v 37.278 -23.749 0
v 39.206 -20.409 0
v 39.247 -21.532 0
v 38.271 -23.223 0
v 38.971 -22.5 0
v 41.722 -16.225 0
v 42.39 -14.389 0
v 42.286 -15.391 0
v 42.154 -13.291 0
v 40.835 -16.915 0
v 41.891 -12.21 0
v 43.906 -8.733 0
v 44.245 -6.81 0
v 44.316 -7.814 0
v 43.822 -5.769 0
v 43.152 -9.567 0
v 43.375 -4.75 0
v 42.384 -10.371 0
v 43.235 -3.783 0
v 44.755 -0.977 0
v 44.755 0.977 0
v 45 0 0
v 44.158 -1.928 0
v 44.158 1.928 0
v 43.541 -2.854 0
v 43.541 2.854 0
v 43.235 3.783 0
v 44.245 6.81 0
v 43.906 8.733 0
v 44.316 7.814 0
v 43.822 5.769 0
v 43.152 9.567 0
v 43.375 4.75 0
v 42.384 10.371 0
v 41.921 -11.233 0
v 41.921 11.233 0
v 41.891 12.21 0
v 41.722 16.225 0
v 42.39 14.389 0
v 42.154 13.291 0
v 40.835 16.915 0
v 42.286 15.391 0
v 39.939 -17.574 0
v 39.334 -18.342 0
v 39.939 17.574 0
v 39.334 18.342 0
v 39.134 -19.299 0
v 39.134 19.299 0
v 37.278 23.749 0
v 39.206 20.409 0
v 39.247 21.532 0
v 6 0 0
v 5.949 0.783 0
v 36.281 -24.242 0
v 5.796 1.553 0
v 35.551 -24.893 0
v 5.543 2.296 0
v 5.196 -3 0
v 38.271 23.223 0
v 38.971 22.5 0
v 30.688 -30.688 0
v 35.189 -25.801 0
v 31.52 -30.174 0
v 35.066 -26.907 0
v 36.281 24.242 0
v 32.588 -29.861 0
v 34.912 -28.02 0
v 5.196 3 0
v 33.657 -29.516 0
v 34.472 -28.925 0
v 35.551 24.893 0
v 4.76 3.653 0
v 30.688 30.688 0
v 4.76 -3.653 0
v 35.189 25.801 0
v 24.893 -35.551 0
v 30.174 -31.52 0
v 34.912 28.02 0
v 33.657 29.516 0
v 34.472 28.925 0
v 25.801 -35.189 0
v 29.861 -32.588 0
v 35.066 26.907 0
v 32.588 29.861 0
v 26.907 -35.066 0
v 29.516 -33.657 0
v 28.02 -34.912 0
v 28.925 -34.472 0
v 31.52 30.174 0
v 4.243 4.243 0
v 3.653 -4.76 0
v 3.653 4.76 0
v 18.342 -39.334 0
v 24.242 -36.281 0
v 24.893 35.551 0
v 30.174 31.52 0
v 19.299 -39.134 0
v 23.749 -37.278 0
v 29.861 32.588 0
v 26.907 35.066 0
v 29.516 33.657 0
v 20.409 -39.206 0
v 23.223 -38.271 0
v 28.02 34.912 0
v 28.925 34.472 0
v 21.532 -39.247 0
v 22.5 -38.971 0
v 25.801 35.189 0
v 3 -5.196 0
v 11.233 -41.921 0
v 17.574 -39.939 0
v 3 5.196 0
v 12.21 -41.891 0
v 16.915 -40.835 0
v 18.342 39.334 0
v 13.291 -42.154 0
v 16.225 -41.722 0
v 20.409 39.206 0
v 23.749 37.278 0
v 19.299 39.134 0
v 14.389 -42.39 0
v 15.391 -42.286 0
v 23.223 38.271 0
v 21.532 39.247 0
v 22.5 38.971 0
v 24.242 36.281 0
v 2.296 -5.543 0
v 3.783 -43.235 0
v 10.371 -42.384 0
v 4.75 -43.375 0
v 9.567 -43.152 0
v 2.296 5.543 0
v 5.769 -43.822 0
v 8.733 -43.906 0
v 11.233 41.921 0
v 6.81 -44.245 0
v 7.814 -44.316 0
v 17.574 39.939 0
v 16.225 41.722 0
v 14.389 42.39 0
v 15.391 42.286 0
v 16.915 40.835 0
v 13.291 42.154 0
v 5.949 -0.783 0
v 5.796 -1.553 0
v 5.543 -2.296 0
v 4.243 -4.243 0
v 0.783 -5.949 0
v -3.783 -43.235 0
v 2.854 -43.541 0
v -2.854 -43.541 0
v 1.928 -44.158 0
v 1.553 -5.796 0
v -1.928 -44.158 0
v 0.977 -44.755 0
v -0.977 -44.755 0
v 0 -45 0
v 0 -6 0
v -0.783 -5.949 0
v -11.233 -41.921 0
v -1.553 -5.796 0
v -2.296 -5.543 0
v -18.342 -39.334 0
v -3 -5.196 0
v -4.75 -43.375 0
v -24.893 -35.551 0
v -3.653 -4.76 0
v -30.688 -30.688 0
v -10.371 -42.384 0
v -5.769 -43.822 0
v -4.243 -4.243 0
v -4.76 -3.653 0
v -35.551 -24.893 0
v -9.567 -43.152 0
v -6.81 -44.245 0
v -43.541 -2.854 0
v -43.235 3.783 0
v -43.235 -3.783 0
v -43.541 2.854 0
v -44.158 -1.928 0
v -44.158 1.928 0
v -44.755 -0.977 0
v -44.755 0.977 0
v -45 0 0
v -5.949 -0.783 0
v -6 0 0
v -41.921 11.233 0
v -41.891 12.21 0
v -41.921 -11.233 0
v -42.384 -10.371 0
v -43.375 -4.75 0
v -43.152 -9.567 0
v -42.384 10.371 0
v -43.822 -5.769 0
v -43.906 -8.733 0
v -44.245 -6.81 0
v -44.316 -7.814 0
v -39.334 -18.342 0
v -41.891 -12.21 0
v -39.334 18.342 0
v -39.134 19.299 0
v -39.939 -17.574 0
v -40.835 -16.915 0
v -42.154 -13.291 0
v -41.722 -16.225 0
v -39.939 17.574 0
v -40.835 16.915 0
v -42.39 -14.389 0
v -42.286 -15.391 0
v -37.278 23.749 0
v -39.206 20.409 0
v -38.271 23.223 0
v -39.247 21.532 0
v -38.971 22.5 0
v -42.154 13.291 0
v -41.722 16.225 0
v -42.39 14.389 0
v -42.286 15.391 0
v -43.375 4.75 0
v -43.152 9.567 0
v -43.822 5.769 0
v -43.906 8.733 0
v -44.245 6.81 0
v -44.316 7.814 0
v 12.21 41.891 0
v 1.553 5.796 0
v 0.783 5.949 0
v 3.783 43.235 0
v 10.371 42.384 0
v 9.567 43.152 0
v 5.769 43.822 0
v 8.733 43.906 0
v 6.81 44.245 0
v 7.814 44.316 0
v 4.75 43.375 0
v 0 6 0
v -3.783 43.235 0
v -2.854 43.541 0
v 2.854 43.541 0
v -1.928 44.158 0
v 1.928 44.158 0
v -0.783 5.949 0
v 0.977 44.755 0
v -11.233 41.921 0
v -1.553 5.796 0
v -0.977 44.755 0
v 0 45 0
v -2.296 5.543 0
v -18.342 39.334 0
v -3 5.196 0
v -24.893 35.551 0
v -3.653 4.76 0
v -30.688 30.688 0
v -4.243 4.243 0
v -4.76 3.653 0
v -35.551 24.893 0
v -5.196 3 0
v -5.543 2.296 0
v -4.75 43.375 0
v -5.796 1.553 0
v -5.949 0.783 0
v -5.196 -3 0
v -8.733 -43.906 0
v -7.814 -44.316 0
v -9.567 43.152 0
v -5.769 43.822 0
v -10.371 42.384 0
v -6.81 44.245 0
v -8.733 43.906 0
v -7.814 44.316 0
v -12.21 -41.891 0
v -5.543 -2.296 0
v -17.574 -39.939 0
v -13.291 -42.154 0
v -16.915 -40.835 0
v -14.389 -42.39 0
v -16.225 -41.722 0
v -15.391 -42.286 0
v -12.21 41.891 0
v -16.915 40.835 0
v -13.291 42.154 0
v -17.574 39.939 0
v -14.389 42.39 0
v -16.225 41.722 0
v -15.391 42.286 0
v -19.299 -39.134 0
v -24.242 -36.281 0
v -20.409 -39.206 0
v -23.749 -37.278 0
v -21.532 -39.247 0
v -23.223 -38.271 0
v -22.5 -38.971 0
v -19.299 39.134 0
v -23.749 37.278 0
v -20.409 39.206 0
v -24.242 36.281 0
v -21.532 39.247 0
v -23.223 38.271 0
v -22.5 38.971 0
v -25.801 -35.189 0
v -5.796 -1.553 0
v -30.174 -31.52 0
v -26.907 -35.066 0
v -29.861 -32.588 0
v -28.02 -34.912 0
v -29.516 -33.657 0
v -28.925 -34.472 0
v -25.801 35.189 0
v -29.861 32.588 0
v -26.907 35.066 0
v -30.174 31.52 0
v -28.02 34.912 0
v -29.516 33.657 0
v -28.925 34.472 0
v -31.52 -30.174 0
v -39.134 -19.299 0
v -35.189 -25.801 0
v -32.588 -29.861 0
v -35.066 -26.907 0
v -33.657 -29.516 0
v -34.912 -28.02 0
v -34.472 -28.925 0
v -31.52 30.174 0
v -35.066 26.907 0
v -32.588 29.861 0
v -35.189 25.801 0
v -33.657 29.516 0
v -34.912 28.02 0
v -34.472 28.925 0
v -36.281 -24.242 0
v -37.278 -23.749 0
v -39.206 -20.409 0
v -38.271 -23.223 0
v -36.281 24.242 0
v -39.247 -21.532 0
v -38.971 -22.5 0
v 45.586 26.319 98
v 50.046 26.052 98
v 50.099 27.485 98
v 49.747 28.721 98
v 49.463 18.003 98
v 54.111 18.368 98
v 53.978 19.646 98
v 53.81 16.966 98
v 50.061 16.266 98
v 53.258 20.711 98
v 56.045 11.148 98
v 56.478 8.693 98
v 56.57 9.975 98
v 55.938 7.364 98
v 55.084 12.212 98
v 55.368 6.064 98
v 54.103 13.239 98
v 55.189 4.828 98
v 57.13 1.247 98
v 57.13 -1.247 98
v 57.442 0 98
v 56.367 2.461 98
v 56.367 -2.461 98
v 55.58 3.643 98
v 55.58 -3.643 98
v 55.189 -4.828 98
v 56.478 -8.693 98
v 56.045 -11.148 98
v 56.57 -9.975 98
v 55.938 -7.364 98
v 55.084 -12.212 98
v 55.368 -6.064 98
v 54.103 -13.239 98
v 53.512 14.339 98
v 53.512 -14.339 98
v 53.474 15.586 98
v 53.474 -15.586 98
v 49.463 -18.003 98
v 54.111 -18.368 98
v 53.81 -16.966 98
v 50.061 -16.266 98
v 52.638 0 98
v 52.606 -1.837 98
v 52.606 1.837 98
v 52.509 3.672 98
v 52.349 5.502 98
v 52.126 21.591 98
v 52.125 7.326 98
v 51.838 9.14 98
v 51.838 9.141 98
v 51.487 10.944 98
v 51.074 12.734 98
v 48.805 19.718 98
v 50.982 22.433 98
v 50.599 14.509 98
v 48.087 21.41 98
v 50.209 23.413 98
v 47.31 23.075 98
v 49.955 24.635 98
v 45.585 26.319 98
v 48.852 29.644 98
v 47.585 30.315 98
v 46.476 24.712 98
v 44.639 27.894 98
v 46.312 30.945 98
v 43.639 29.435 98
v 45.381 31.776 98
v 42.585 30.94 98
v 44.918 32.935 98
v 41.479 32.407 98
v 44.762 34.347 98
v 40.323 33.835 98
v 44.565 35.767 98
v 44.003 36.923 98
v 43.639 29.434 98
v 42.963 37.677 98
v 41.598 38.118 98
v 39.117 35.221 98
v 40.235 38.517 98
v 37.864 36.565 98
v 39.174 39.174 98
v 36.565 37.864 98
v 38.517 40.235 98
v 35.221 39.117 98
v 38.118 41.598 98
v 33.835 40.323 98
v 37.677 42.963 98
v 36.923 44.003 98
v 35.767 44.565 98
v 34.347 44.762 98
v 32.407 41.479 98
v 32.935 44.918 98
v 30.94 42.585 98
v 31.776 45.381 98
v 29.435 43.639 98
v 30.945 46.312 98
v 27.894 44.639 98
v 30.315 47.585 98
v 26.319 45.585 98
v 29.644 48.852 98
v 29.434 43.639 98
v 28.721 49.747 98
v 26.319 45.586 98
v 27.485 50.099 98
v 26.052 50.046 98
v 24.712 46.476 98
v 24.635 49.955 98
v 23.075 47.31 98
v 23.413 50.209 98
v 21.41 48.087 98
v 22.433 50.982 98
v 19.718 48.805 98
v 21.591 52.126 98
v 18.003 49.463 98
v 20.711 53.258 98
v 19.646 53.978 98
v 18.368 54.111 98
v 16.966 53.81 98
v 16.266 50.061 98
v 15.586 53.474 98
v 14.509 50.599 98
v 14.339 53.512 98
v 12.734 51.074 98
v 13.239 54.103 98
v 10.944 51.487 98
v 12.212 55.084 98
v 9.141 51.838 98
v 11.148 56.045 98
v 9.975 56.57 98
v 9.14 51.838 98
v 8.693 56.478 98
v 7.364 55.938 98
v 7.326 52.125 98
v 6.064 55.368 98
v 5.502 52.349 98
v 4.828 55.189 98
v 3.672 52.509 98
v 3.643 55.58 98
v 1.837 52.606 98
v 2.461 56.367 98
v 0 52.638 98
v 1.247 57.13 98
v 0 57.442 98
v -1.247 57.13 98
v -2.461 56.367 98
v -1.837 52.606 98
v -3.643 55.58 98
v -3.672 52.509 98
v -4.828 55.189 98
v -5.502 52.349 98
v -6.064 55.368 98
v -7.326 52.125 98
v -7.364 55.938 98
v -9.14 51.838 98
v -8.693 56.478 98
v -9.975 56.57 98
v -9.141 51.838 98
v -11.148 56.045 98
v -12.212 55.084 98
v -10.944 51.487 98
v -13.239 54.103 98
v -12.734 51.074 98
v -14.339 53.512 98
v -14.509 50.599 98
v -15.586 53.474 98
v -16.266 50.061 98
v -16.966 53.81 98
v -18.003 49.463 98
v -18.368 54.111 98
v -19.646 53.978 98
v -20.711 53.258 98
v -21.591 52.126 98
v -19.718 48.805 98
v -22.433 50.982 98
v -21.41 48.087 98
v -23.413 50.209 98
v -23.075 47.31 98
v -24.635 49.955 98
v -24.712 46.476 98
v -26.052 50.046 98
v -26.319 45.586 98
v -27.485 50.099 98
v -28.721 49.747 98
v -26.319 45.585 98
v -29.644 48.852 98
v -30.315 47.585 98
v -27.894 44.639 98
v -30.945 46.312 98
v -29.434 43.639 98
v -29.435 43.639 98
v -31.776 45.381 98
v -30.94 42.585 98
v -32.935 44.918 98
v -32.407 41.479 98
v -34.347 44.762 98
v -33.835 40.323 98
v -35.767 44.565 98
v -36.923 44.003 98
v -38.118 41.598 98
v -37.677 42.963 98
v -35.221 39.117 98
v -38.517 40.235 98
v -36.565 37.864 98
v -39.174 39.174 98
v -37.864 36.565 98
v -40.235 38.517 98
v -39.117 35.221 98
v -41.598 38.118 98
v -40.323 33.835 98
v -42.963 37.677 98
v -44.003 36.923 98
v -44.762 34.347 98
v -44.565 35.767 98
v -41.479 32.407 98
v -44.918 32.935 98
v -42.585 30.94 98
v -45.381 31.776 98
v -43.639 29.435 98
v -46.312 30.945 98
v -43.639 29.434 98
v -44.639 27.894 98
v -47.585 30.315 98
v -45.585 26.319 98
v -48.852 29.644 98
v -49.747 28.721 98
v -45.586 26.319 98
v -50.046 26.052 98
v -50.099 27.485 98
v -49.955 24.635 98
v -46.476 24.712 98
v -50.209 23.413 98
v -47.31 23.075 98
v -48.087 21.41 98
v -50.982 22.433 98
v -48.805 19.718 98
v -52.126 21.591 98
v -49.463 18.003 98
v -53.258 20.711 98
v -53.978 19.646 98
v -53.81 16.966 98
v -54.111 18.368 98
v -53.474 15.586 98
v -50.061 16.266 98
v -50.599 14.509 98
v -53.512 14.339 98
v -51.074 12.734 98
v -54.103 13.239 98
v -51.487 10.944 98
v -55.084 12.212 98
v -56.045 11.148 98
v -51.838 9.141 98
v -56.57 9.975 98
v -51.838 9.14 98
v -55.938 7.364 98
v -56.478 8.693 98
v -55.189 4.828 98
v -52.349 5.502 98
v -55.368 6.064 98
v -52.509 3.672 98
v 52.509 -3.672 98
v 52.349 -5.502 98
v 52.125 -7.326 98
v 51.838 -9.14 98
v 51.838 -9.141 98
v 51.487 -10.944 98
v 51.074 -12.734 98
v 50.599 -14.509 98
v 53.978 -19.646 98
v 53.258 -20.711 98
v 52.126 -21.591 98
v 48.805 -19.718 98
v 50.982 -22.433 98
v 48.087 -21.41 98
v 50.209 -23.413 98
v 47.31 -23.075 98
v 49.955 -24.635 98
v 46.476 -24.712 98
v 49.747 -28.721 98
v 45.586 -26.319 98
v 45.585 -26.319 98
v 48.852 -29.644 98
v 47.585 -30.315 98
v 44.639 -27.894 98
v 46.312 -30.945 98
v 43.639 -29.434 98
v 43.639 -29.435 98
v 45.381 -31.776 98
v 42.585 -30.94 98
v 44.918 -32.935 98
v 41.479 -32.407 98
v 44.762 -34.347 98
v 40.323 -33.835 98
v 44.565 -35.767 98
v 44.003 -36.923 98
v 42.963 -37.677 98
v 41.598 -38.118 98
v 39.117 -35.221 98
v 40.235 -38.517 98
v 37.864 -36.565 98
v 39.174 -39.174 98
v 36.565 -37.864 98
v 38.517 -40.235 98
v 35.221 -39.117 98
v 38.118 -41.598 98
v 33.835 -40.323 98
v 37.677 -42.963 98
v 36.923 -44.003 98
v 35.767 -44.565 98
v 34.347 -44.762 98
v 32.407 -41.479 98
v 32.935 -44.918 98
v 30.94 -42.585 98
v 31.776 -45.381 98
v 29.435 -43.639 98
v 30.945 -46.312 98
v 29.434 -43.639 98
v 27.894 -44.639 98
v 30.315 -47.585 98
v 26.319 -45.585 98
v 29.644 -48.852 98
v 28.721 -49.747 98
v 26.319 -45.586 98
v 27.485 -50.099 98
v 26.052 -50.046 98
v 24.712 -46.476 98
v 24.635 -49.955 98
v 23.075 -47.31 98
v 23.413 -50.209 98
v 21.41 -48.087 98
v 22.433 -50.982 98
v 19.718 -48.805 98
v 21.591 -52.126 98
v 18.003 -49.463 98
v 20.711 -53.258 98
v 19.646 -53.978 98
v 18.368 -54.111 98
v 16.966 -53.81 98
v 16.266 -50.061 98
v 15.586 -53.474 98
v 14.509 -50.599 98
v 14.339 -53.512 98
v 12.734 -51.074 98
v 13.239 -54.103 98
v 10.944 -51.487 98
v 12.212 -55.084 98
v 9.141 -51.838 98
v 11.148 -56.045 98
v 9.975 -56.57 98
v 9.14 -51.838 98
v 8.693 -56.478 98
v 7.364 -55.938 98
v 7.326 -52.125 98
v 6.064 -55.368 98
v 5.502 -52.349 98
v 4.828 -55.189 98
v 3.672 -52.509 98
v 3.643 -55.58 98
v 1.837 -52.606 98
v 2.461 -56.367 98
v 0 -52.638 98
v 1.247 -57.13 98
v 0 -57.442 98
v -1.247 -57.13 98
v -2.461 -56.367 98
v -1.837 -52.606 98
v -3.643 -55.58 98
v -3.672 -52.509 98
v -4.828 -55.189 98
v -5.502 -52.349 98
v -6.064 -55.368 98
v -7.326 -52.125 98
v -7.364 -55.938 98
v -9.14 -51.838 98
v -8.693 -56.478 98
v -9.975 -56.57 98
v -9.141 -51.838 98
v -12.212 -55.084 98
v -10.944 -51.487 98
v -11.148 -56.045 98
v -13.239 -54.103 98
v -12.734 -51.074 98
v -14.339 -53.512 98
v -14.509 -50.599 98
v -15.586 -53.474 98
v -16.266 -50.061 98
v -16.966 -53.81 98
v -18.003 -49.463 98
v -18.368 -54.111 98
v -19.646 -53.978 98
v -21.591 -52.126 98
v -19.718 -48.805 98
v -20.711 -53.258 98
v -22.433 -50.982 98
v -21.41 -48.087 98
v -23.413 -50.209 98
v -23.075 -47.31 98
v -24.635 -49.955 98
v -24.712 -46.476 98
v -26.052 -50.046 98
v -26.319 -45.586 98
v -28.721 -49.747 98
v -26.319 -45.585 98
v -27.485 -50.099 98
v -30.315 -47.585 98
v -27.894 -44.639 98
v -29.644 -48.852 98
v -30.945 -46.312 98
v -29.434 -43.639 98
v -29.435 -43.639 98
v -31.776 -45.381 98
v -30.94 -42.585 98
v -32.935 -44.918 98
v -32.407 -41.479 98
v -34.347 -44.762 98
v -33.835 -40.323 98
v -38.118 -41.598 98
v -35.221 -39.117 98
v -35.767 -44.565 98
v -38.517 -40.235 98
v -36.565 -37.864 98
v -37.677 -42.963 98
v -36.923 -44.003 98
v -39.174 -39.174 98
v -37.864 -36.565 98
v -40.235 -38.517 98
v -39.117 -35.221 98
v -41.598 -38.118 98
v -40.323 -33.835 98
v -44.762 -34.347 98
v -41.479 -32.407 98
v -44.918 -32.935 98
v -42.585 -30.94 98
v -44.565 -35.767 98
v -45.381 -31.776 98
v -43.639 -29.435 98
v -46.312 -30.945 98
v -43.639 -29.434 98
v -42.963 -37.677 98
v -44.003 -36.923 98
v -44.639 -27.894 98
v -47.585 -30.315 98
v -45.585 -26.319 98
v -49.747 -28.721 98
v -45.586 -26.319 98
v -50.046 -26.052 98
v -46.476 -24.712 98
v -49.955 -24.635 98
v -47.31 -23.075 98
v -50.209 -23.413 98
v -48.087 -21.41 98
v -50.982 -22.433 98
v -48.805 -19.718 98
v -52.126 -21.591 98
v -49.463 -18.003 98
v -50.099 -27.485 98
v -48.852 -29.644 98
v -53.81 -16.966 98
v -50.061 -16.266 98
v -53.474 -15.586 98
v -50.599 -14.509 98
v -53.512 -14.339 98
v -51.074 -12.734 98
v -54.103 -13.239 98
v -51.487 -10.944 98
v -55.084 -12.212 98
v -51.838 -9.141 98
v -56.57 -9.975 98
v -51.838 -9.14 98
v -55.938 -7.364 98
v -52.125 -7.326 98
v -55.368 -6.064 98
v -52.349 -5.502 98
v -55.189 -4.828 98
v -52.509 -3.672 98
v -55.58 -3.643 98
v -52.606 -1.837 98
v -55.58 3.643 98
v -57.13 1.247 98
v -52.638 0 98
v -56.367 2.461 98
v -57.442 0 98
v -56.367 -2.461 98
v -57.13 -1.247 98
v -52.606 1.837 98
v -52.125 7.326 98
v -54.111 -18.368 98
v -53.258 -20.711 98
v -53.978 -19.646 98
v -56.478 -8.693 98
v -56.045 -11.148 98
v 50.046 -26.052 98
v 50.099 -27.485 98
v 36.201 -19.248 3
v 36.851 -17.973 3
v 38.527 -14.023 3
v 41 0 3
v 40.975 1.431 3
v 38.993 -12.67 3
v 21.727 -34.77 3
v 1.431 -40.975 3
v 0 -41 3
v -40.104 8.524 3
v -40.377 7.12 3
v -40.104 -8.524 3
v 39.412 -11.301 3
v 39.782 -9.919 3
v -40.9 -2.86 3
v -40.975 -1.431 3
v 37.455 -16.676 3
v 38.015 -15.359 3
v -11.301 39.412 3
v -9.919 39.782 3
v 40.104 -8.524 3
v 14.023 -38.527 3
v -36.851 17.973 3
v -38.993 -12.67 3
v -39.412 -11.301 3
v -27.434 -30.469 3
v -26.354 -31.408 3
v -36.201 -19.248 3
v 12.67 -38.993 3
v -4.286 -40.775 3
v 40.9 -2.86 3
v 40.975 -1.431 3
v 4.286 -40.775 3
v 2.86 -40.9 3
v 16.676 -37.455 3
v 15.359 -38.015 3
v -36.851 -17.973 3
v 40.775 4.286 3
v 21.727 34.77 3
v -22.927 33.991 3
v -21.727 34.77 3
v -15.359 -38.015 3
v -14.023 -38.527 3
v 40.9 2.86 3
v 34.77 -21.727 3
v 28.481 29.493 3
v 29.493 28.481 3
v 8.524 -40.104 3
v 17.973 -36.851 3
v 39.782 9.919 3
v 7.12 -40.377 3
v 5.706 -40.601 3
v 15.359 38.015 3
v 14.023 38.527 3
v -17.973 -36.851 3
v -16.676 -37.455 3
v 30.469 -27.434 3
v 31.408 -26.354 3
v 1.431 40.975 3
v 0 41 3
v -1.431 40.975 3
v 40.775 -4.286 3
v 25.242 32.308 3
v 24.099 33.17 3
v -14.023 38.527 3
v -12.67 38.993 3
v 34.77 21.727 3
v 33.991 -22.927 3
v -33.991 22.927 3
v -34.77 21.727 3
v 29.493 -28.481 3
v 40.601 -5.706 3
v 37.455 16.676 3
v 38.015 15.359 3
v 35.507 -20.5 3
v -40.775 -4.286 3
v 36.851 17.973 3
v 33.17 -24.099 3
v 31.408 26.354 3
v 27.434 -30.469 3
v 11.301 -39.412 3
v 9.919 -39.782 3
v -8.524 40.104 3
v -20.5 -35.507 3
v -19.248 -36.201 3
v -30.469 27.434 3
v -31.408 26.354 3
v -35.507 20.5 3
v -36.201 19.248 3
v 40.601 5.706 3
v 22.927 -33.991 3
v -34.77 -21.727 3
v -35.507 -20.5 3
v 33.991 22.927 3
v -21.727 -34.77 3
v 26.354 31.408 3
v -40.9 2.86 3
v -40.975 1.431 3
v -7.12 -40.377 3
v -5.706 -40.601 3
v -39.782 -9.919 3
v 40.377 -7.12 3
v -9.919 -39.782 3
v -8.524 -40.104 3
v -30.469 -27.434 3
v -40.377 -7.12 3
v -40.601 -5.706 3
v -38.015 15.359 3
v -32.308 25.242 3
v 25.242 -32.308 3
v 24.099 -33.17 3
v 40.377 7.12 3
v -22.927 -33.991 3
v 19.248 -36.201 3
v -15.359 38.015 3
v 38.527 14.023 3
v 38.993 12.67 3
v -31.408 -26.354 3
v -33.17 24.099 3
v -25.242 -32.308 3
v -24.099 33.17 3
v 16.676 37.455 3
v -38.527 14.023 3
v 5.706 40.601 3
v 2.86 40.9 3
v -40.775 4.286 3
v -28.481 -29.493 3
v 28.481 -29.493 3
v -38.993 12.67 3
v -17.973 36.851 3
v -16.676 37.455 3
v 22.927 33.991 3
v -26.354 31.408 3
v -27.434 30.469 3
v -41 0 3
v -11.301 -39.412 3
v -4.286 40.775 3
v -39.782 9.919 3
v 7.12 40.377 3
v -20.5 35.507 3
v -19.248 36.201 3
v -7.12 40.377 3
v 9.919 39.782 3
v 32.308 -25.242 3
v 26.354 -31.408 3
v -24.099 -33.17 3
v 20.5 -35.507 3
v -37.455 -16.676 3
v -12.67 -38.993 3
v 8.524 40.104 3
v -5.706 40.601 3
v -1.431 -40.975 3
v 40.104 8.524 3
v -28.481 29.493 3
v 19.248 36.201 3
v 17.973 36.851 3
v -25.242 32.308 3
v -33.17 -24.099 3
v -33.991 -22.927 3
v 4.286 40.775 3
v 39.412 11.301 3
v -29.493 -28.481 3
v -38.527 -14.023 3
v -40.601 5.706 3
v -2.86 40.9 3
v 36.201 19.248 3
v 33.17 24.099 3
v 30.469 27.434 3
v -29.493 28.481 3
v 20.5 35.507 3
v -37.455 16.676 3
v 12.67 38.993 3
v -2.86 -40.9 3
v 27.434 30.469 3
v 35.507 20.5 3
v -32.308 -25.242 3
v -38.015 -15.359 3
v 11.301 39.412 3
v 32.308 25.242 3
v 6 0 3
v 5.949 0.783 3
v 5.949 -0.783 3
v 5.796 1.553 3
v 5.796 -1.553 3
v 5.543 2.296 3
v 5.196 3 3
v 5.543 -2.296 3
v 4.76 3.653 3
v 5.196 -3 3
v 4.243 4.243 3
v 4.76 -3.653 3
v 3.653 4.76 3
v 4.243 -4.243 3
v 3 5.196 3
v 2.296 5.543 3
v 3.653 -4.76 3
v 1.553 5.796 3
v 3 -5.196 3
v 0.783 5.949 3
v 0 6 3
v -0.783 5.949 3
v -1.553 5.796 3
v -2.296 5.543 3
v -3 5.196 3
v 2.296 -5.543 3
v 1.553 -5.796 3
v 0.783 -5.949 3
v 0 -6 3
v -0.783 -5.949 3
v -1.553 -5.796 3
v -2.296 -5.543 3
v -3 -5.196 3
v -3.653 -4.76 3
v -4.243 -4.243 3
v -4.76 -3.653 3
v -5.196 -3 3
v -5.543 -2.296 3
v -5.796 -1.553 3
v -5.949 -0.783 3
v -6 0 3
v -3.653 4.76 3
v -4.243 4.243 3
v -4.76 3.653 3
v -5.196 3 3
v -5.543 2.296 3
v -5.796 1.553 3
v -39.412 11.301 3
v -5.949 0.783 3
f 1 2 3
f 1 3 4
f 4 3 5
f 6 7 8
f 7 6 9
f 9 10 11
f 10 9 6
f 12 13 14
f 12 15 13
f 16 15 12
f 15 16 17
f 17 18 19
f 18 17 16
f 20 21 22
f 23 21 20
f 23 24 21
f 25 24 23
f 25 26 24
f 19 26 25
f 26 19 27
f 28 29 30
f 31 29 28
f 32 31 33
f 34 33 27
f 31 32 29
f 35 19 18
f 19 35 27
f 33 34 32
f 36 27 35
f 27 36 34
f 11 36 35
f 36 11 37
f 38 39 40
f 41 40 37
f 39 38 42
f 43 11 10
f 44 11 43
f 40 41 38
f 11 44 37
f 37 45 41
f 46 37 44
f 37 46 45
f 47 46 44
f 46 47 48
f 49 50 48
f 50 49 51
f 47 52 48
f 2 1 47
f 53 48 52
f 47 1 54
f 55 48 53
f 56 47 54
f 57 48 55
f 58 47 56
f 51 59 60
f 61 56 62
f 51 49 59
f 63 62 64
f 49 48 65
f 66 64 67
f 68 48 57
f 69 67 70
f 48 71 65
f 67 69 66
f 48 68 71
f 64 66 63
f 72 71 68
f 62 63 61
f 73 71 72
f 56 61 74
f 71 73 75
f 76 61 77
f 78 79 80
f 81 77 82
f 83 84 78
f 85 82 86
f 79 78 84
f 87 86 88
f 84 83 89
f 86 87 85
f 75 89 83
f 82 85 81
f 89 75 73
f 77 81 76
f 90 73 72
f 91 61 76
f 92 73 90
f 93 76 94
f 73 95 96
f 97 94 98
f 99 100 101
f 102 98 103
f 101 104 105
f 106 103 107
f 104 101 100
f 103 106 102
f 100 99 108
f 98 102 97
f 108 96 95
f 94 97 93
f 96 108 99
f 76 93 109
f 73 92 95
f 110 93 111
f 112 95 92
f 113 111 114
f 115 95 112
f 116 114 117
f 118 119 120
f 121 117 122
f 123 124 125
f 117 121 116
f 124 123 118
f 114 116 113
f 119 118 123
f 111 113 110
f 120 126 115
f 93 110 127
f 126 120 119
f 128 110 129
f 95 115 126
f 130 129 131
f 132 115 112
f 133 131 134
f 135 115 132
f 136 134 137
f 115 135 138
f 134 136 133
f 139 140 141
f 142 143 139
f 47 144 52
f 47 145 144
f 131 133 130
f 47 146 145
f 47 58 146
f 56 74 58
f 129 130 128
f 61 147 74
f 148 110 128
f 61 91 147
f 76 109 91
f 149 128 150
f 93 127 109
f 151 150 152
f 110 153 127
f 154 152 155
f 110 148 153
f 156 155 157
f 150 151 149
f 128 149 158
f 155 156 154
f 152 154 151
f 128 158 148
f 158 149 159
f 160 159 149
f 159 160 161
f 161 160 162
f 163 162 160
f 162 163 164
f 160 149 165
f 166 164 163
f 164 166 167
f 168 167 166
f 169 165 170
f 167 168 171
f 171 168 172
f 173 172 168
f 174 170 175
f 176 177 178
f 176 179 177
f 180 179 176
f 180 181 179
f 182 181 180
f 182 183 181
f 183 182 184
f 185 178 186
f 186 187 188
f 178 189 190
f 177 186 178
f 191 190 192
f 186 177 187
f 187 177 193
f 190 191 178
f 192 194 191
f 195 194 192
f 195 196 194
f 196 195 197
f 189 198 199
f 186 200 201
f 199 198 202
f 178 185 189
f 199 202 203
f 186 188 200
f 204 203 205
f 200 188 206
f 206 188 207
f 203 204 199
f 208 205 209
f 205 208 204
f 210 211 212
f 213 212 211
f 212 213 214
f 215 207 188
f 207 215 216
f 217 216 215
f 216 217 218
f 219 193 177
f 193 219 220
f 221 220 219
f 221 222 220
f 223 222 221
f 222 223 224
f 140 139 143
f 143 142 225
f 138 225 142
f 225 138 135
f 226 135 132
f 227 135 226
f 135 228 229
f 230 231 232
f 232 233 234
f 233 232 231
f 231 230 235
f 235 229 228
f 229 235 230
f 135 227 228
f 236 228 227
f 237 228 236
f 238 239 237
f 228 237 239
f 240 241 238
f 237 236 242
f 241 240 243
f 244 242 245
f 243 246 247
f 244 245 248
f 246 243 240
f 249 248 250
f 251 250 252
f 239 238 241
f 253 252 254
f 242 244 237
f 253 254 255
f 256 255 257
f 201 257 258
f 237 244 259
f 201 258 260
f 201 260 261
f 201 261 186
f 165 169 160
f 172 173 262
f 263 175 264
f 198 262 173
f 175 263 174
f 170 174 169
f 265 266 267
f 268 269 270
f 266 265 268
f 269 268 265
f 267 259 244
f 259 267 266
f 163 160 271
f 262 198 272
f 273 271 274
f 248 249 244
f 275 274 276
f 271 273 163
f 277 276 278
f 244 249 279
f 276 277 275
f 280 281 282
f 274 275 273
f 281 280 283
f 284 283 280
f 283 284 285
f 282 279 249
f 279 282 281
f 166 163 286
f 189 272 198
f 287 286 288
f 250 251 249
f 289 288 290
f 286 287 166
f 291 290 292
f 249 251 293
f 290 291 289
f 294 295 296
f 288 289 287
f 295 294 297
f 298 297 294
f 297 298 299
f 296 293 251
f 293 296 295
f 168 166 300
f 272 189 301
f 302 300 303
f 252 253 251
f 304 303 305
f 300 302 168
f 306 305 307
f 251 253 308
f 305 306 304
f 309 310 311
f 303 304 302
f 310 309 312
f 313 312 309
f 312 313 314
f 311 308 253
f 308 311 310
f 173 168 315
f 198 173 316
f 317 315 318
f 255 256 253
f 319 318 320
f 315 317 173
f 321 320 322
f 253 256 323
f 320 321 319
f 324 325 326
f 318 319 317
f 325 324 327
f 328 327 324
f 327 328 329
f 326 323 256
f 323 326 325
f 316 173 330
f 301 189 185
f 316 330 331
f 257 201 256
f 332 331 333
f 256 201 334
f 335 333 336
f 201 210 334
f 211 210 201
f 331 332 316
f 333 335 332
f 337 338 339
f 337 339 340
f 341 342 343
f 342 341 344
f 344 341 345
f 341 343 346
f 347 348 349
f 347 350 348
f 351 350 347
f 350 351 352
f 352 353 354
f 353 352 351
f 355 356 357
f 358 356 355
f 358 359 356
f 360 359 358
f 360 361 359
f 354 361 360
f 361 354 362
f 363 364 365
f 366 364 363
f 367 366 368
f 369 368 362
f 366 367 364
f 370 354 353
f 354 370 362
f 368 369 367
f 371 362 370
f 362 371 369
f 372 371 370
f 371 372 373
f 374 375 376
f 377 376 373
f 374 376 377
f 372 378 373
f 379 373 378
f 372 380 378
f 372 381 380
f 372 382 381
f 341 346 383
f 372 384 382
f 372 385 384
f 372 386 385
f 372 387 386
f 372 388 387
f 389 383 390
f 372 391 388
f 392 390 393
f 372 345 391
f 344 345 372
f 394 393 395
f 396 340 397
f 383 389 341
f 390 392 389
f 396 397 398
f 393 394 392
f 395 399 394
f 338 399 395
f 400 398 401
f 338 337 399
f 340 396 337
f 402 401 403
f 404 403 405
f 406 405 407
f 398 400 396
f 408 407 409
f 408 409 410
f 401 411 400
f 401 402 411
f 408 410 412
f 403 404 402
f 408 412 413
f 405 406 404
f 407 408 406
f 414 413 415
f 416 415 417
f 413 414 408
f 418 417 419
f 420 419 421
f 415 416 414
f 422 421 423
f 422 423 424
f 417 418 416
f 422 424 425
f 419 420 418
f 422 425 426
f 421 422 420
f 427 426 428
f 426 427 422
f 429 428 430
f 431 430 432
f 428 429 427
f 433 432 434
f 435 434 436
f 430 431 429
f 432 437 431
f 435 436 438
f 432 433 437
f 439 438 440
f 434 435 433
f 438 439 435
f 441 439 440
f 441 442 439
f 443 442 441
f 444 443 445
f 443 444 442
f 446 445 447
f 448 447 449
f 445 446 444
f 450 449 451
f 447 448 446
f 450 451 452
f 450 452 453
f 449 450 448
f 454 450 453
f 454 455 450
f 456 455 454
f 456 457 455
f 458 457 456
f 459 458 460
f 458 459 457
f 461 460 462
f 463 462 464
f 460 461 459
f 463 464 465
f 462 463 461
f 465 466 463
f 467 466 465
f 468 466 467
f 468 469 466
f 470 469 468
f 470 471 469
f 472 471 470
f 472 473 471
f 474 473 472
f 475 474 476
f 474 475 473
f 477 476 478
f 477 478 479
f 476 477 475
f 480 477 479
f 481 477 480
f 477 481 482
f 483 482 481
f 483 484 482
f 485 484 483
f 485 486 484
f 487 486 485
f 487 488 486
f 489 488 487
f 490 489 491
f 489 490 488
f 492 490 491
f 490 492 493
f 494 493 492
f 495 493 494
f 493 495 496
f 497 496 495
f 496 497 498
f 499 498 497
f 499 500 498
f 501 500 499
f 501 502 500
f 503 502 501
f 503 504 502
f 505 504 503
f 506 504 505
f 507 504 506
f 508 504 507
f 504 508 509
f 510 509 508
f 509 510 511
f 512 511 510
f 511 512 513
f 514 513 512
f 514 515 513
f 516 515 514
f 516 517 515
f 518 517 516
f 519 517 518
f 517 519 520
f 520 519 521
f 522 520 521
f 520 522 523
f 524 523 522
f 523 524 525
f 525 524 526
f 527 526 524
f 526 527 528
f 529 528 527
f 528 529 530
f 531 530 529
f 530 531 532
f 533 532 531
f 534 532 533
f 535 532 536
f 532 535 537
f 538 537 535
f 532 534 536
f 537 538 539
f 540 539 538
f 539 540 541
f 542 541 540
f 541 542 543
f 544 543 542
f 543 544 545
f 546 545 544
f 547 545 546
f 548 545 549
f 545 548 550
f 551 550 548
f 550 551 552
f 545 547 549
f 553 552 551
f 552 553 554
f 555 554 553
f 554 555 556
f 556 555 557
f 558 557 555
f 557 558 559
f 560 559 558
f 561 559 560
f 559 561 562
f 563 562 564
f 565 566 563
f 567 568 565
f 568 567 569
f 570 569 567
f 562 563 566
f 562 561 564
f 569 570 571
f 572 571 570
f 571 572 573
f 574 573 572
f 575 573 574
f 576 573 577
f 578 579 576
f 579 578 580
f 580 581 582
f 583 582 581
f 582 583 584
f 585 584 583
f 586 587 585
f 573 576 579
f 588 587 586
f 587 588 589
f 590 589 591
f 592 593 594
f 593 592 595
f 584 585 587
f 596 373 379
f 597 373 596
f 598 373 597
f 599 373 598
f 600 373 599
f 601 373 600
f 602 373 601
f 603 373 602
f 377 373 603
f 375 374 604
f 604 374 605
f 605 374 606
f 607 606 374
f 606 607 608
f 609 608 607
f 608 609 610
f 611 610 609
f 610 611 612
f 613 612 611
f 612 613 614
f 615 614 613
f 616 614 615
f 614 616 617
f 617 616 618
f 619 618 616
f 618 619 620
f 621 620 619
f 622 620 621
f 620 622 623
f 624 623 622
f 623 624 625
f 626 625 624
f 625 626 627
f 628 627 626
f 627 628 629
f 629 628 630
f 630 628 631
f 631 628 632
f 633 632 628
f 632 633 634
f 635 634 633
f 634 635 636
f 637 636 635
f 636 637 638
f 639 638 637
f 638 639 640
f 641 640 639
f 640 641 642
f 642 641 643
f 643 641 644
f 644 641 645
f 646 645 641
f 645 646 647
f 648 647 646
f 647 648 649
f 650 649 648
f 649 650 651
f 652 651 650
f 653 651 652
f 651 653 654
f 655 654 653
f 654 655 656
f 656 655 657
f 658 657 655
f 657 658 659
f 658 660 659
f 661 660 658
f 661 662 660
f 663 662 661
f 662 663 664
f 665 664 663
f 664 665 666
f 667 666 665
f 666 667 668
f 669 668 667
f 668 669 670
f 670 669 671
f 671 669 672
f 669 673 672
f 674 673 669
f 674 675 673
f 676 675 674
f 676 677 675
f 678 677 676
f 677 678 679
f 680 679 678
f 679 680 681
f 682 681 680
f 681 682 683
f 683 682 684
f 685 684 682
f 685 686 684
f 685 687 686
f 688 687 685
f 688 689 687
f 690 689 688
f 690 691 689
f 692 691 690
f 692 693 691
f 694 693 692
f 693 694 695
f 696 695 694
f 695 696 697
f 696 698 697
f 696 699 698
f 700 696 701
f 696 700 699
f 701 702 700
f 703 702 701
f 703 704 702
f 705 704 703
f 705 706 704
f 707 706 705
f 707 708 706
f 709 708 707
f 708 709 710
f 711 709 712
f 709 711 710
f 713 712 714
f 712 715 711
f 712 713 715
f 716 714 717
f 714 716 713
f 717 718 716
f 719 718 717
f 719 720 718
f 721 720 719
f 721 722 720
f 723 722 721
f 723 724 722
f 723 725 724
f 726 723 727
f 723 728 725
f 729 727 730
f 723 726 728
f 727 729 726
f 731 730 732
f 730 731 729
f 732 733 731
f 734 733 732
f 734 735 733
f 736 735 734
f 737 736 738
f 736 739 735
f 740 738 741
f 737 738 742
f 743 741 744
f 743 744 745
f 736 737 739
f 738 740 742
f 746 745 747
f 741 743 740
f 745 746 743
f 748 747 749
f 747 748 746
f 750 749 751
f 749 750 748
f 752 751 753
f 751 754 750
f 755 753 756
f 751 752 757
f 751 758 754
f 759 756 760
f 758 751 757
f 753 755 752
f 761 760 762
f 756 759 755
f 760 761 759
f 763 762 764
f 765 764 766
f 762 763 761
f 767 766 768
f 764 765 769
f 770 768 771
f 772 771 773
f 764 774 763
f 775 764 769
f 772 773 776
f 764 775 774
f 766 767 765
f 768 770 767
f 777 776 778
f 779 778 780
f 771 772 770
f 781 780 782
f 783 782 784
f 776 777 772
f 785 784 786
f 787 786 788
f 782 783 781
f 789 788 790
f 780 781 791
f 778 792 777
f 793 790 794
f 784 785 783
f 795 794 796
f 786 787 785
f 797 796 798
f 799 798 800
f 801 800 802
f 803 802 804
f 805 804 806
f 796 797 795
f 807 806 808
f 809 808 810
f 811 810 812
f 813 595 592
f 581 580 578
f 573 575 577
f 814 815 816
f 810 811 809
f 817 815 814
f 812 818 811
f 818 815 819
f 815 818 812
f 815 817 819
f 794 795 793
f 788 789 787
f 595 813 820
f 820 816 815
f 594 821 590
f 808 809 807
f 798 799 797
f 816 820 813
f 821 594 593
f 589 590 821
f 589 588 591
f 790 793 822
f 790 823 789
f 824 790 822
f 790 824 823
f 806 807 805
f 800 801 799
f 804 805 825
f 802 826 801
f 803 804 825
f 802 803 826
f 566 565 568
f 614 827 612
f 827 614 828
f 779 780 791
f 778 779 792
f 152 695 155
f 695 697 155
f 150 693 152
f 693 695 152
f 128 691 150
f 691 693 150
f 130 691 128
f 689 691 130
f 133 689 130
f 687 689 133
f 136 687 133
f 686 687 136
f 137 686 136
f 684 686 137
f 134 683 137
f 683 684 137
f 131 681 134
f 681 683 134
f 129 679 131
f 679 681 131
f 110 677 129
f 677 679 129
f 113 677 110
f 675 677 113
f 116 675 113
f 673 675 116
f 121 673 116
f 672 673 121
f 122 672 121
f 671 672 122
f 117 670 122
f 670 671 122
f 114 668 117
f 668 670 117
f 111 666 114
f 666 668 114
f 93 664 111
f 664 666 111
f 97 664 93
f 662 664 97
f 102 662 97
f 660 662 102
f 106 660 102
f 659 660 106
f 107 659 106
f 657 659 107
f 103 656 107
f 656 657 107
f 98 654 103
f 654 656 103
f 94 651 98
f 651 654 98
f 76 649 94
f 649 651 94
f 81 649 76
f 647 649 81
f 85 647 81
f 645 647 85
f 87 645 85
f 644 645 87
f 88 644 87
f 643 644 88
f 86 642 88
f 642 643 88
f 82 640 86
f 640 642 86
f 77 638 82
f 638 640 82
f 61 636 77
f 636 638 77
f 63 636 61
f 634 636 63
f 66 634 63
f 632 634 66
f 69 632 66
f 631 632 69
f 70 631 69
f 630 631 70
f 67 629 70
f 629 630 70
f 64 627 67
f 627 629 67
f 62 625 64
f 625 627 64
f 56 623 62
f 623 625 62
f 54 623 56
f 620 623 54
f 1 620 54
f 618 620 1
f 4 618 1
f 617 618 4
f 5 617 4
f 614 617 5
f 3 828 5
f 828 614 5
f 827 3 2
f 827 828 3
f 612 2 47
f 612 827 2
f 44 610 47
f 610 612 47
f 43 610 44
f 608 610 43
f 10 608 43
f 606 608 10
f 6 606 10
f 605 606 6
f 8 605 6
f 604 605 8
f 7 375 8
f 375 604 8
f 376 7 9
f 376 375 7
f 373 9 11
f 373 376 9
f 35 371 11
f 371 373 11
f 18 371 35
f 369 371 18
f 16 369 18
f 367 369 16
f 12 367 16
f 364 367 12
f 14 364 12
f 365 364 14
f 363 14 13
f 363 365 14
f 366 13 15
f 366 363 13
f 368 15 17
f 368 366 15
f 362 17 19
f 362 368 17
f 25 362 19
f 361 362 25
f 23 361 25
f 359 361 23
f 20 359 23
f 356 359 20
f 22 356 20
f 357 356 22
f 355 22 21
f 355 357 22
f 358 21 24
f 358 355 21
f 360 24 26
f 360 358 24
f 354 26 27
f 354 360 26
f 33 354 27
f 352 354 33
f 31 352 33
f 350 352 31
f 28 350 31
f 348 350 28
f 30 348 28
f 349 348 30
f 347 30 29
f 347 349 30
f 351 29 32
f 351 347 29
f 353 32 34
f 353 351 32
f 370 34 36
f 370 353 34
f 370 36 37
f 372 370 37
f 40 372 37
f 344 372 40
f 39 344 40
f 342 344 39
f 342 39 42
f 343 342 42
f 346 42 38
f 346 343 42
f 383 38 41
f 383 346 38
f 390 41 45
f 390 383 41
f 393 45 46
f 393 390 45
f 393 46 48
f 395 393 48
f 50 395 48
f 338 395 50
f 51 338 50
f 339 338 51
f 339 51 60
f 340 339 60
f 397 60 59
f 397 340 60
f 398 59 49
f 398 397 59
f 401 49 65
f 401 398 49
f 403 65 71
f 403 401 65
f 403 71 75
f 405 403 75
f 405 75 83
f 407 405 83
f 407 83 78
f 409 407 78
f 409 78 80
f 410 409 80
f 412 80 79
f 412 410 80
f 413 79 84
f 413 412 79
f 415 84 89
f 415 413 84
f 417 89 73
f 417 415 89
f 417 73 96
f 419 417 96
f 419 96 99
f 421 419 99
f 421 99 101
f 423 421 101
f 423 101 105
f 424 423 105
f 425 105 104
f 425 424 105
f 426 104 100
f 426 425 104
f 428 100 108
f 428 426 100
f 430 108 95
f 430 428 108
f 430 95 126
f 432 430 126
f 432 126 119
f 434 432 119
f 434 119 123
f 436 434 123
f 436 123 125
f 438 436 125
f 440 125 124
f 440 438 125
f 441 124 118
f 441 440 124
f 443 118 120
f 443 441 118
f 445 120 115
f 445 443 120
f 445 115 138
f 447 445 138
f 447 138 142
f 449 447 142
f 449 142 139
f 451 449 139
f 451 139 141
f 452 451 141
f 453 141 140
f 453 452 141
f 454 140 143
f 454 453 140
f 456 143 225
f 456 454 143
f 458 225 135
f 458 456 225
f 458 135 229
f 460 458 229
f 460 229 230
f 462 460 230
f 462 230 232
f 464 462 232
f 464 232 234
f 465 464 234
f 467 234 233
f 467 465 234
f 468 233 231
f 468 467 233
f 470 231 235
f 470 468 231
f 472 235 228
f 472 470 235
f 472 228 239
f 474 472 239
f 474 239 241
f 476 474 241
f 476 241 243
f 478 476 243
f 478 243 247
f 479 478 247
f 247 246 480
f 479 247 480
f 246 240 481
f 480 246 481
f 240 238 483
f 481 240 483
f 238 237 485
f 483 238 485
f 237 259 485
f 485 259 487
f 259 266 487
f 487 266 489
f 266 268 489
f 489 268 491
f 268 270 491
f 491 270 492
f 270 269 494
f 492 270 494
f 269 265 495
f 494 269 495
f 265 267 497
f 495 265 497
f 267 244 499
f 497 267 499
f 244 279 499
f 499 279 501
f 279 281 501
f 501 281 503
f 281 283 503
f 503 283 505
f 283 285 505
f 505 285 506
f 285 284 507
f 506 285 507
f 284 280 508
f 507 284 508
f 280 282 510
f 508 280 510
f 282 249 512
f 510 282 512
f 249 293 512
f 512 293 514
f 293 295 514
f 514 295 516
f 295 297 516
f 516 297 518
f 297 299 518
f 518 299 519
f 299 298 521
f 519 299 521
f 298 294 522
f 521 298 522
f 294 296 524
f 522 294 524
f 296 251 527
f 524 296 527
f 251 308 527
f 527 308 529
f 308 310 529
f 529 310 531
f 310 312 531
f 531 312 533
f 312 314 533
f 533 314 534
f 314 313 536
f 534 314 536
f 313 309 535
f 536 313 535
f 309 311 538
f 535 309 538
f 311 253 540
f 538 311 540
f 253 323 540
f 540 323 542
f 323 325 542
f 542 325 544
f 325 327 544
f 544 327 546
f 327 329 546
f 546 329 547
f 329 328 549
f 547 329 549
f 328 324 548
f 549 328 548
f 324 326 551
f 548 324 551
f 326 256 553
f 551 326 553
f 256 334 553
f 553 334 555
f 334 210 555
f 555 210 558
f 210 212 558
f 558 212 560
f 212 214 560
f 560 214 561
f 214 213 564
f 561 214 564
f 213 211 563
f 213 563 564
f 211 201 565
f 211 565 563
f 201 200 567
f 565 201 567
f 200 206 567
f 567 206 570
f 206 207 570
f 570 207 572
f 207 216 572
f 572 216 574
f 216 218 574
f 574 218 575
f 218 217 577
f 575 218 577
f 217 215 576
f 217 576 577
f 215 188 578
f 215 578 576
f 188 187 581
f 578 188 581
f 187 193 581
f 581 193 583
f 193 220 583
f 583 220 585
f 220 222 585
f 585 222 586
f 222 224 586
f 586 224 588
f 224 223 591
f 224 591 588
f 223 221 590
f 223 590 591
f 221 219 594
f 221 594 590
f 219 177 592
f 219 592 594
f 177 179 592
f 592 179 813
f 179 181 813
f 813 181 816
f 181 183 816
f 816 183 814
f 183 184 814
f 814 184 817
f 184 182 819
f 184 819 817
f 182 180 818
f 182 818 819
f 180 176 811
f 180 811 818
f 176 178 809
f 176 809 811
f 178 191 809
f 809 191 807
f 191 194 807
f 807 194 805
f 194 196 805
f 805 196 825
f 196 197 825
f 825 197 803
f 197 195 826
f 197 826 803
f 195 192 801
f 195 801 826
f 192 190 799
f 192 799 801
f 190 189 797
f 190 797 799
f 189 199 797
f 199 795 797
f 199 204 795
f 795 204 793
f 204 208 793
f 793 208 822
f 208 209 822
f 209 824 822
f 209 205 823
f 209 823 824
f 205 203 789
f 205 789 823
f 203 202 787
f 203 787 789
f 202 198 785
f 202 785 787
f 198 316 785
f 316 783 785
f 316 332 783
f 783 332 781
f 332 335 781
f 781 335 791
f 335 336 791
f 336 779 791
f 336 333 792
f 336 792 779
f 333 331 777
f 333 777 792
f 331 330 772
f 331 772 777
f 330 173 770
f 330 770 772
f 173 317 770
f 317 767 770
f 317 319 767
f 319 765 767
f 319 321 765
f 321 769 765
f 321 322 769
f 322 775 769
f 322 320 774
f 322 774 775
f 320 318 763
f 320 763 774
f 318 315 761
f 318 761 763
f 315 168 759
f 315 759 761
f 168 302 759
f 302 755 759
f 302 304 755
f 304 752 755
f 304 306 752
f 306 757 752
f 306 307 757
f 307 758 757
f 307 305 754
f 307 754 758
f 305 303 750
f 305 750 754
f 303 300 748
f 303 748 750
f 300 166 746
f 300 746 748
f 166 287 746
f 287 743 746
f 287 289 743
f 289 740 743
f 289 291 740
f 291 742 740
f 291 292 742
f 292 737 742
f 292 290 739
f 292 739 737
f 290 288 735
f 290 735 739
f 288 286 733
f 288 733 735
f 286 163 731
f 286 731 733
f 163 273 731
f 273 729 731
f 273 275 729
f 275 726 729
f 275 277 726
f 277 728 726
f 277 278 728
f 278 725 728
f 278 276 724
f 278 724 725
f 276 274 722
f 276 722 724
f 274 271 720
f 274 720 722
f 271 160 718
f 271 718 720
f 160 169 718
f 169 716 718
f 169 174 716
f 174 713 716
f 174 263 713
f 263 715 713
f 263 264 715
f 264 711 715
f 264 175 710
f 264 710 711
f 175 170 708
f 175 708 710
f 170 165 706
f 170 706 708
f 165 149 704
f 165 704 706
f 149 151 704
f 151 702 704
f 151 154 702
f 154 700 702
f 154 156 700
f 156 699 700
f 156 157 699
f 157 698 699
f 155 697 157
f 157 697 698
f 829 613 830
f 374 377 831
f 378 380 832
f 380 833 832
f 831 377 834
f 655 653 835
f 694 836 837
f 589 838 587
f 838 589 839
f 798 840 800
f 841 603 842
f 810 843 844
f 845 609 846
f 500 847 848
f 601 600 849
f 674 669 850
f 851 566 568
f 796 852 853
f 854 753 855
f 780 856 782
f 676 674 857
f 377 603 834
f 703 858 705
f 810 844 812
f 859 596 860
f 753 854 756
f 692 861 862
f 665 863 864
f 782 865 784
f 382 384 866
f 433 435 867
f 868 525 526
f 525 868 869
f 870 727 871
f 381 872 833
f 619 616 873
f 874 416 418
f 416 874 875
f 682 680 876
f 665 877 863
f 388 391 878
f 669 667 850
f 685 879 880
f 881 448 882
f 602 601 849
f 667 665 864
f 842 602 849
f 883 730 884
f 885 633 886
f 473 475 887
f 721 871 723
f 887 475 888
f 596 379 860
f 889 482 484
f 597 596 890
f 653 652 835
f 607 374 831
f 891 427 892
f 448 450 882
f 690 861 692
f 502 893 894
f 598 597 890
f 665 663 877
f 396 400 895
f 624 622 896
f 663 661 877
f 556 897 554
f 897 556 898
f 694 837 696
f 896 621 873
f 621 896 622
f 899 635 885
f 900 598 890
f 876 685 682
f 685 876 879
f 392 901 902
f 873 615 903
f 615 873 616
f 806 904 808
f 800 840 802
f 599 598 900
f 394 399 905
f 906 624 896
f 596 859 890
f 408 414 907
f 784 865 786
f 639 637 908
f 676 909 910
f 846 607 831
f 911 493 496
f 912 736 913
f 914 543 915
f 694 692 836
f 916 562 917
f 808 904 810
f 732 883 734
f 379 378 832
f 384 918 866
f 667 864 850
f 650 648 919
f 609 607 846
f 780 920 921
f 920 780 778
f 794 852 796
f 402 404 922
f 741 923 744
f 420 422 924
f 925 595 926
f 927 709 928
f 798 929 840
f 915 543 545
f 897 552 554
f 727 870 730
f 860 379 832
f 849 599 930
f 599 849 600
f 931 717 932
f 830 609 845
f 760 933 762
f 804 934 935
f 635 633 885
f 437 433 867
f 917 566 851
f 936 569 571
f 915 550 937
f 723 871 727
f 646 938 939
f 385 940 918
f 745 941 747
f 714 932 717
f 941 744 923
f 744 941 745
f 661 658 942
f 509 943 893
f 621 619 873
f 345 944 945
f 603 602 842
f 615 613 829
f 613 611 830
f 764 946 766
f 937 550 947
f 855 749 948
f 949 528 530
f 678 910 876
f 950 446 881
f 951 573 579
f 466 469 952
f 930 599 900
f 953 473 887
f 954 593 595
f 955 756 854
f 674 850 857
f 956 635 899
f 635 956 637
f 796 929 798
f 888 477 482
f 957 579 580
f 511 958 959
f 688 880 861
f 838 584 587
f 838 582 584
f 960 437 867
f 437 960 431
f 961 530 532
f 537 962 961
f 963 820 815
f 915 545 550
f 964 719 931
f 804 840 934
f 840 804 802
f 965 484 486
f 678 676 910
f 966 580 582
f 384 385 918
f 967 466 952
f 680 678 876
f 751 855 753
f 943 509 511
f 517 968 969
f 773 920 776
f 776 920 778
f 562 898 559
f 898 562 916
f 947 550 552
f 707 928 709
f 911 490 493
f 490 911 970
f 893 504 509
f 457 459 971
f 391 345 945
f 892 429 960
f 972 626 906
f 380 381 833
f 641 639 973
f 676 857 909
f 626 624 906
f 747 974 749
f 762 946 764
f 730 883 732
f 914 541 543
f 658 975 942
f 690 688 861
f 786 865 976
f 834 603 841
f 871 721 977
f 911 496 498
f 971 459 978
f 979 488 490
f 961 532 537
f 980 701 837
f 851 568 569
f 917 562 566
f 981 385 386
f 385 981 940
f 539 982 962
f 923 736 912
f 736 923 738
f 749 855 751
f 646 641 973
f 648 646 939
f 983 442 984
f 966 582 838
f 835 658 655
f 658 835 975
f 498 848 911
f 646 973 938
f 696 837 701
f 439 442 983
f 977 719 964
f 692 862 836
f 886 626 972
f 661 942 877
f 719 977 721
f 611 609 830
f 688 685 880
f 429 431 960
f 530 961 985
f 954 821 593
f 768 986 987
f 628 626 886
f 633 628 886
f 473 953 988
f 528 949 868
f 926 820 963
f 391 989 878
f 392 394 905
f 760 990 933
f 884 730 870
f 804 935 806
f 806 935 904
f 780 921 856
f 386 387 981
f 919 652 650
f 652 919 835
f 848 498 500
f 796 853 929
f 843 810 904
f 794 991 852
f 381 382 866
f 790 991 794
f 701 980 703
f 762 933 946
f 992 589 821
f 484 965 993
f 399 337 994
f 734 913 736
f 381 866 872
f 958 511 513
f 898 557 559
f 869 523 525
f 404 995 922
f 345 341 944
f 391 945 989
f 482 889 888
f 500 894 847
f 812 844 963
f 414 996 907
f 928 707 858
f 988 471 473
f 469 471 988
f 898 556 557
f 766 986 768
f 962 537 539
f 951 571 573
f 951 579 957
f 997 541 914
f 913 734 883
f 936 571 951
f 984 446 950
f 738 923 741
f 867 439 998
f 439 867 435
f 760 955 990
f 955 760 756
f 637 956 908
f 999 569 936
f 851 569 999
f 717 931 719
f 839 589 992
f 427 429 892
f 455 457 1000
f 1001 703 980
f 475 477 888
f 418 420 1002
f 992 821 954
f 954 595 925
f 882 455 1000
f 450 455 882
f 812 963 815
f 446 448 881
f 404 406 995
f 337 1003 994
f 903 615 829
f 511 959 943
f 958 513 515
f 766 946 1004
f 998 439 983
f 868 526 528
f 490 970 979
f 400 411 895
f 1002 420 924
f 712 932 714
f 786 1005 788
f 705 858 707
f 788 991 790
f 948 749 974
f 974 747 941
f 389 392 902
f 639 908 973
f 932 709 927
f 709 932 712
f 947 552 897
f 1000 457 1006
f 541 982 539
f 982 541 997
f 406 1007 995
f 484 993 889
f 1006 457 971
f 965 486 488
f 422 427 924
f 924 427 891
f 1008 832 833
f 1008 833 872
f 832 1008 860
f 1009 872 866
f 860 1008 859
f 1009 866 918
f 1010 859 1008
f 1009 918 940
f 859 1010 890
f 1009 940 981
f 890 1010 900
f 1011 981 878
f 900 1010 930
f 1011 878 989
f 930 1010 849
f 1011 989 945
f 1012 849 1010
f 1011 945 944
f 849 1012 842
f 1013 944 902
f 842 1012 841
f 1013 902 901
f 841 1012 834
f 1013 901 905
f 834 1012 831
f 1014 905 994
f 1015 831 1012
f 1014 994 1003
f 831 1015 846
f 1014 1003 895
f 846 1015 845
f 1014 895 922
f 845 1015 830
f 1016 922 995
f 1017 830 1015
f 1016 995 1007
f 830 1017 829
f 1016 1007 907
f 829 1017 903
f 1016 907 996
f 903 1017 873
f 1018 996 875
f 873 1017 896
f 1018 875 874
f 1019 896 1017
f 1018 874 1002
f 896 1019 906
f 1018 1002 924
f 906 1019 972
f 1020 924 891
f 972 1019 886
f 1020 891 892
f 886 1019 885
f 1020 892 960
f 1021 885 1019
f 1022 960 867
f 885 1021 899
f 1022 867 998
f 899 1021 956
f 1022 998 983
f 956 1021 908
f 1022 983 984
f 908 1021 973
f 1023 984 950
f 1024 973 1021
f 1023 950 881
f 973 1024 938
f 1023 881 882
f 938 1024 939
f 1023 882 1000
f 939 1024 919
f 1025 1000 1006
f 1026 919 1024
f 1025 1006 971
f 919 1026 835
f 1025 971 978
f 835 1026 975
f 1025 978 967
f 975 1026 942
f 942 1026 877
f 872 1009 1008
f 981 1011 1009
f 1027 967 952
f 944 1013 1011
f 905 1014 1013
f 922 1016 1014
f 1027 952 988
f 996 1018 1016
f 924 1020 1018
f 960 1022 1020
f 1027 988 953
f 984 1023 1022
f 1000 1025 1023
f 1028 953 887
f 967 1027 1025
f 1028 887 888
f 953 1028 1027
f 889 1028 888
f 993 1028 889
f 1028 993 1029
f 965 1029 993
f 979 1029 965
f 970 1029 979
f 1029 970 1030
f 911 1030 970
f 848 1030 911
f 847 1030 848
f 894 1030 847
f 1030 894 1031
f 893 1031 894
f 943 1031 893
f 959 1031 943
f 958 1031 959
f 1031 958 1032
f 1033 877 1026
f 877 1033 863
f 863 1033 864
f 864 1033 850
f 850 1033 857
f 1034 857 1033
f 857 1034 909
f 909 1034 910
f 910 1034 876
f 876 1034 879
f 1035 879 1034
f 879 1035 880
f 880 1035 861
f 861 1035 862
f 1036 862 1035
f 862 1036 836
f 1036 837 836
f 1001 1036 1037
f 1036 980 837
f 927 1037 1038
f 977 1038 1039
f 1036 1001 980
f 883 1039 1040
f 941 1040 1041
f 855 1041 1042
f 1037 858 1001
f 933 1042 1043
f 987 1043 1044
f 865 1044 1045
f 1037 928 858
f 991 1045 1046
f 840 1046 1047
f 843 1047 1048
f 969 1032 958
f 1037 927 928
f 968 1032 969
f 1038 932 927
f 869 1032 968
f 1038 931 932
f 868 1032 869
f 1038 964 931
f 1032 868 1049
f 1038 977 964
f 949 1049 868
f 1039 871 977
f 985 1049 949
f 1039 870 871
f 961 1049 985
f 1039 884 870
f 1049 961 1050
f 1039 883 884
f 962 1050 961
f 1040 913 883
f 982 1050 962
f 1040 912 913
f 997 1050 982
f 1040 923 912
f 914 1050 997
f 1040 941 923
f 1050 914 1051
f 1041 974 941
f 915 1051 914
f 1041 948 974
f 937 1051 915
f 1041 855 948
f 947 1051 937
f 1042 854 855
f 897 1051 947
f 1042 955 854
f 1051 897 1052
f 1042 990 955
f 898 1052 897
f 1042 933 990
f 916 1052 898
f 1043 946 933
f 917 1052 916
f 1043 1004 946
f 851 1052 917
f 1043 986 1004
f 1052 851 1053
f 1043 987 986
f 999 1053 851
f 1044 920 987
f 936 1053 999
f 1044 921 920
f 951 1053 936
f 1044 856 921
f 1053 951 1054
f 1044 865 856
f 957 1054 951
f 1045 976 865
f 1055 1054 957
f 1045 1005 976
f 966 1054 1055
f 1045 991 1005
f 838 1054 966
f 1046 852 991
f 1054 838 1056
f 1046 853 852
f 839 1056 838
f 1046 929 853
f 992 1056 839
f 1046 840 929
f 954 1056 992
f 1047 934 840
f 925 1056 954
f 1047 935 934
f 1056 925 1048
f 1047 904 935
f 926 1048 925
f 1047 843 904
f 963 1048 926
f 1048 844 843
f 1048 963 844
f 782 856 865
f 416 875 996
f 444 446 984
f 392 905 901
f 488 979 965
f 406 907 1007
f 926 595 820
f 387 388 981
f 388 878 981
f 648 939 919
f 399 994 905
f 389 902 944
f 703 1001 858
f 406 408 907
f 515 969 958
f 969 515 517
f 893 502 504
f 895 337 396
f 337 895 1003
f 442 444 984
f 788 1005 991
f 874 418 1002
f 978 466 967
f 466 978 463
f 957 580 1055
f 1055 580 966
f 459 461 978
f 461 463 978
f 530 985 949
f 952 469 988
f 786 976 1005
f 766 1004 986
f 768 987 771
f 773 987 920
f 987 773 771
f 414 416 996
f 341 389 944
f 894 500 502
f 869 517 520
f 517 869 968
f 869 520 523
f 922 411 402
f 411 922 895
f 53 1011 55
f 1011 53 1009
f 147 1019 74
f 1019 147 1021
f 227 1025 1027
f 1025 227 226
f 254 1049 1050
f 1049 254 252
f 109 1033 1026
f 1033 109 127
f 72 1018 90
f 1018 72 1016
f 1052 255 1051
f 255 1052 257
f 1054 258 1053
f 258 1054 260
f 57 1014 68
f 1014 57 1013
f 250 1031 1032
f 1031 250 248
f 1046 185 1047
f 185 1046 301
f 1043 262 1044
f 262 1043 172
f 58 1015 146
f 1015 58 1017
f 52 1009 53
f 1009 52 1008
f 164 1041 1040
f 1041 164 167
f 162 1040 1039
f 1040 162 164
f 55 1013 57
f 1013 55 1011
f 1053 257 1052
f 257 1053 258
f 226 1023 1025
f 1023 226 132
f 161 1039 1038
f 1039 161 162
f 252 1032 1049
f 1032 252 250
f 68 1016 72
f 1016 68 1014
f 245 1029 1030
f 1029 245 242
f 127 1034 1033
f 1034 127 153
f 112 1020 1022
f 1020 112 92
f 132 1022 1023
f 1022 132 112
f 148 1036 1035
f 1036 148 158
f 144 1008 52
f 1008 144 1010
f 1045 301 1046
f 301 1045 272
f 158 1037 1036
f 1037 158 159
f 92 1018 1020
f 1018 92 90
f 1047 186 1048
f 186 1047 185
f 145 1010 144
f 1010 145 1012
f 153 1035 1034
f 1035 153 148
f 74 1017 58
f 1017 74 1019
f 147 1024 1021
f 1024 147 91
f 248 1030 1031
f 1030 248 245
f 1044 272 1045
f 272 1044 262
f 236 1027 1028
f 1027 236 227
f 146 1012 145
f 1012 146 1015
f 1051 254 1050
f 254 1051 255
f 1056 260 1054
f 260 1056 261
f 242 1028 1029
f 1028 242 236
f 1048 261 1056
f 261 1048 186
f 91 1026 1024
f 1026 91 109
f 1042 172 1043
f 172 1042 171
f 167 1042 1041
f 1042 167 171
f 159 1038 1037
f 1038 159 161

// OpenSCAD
// Ribbed planter for a 4 inch nursery pot (102 mm across the top, 90 mm tall), drain hole.
pot_top = 102;
pot_h = 90;
clear = 2;            // room around the nursery pot on each side
wall = 2.4;
floor_t = 3;
H = pot_h + floor_t + 5;
inner_top = pot_top + 2 * clear;   // 106
inner_base = 82;
ribs = 36;
rib_depth = 1.6;
drain_d = 12;

module ribbed(d) {
    n = ribs * 8;
    polygon([for (k = [0:n - 1])
        let(a = 360 * k / n, r = d / 2 + rib_depth * (0.5 + 0.5 * cos(ribs * a)))
        [r * cos(a), r * sin(a)]]);
}

difference() {
    linear_extrude(H, scale = (inner_top + 2 * wall) / (inner_base + 2 * wall), convexity = 4)
        ribbed(inner_base + 2 * wall);
    translate([0, 0, floor_t]) cylinder(d1 = inner_base, d2 = inner_base + (inner_top - inner_base) * (H - floor_t + 0.01) / H + 0.01, h = H - floor_t + 0.01, $fn = 180);
    translate([0, 0, -1]) cylinder(d = drain_d, h = floor_t + 2, $fn = 48);
}
